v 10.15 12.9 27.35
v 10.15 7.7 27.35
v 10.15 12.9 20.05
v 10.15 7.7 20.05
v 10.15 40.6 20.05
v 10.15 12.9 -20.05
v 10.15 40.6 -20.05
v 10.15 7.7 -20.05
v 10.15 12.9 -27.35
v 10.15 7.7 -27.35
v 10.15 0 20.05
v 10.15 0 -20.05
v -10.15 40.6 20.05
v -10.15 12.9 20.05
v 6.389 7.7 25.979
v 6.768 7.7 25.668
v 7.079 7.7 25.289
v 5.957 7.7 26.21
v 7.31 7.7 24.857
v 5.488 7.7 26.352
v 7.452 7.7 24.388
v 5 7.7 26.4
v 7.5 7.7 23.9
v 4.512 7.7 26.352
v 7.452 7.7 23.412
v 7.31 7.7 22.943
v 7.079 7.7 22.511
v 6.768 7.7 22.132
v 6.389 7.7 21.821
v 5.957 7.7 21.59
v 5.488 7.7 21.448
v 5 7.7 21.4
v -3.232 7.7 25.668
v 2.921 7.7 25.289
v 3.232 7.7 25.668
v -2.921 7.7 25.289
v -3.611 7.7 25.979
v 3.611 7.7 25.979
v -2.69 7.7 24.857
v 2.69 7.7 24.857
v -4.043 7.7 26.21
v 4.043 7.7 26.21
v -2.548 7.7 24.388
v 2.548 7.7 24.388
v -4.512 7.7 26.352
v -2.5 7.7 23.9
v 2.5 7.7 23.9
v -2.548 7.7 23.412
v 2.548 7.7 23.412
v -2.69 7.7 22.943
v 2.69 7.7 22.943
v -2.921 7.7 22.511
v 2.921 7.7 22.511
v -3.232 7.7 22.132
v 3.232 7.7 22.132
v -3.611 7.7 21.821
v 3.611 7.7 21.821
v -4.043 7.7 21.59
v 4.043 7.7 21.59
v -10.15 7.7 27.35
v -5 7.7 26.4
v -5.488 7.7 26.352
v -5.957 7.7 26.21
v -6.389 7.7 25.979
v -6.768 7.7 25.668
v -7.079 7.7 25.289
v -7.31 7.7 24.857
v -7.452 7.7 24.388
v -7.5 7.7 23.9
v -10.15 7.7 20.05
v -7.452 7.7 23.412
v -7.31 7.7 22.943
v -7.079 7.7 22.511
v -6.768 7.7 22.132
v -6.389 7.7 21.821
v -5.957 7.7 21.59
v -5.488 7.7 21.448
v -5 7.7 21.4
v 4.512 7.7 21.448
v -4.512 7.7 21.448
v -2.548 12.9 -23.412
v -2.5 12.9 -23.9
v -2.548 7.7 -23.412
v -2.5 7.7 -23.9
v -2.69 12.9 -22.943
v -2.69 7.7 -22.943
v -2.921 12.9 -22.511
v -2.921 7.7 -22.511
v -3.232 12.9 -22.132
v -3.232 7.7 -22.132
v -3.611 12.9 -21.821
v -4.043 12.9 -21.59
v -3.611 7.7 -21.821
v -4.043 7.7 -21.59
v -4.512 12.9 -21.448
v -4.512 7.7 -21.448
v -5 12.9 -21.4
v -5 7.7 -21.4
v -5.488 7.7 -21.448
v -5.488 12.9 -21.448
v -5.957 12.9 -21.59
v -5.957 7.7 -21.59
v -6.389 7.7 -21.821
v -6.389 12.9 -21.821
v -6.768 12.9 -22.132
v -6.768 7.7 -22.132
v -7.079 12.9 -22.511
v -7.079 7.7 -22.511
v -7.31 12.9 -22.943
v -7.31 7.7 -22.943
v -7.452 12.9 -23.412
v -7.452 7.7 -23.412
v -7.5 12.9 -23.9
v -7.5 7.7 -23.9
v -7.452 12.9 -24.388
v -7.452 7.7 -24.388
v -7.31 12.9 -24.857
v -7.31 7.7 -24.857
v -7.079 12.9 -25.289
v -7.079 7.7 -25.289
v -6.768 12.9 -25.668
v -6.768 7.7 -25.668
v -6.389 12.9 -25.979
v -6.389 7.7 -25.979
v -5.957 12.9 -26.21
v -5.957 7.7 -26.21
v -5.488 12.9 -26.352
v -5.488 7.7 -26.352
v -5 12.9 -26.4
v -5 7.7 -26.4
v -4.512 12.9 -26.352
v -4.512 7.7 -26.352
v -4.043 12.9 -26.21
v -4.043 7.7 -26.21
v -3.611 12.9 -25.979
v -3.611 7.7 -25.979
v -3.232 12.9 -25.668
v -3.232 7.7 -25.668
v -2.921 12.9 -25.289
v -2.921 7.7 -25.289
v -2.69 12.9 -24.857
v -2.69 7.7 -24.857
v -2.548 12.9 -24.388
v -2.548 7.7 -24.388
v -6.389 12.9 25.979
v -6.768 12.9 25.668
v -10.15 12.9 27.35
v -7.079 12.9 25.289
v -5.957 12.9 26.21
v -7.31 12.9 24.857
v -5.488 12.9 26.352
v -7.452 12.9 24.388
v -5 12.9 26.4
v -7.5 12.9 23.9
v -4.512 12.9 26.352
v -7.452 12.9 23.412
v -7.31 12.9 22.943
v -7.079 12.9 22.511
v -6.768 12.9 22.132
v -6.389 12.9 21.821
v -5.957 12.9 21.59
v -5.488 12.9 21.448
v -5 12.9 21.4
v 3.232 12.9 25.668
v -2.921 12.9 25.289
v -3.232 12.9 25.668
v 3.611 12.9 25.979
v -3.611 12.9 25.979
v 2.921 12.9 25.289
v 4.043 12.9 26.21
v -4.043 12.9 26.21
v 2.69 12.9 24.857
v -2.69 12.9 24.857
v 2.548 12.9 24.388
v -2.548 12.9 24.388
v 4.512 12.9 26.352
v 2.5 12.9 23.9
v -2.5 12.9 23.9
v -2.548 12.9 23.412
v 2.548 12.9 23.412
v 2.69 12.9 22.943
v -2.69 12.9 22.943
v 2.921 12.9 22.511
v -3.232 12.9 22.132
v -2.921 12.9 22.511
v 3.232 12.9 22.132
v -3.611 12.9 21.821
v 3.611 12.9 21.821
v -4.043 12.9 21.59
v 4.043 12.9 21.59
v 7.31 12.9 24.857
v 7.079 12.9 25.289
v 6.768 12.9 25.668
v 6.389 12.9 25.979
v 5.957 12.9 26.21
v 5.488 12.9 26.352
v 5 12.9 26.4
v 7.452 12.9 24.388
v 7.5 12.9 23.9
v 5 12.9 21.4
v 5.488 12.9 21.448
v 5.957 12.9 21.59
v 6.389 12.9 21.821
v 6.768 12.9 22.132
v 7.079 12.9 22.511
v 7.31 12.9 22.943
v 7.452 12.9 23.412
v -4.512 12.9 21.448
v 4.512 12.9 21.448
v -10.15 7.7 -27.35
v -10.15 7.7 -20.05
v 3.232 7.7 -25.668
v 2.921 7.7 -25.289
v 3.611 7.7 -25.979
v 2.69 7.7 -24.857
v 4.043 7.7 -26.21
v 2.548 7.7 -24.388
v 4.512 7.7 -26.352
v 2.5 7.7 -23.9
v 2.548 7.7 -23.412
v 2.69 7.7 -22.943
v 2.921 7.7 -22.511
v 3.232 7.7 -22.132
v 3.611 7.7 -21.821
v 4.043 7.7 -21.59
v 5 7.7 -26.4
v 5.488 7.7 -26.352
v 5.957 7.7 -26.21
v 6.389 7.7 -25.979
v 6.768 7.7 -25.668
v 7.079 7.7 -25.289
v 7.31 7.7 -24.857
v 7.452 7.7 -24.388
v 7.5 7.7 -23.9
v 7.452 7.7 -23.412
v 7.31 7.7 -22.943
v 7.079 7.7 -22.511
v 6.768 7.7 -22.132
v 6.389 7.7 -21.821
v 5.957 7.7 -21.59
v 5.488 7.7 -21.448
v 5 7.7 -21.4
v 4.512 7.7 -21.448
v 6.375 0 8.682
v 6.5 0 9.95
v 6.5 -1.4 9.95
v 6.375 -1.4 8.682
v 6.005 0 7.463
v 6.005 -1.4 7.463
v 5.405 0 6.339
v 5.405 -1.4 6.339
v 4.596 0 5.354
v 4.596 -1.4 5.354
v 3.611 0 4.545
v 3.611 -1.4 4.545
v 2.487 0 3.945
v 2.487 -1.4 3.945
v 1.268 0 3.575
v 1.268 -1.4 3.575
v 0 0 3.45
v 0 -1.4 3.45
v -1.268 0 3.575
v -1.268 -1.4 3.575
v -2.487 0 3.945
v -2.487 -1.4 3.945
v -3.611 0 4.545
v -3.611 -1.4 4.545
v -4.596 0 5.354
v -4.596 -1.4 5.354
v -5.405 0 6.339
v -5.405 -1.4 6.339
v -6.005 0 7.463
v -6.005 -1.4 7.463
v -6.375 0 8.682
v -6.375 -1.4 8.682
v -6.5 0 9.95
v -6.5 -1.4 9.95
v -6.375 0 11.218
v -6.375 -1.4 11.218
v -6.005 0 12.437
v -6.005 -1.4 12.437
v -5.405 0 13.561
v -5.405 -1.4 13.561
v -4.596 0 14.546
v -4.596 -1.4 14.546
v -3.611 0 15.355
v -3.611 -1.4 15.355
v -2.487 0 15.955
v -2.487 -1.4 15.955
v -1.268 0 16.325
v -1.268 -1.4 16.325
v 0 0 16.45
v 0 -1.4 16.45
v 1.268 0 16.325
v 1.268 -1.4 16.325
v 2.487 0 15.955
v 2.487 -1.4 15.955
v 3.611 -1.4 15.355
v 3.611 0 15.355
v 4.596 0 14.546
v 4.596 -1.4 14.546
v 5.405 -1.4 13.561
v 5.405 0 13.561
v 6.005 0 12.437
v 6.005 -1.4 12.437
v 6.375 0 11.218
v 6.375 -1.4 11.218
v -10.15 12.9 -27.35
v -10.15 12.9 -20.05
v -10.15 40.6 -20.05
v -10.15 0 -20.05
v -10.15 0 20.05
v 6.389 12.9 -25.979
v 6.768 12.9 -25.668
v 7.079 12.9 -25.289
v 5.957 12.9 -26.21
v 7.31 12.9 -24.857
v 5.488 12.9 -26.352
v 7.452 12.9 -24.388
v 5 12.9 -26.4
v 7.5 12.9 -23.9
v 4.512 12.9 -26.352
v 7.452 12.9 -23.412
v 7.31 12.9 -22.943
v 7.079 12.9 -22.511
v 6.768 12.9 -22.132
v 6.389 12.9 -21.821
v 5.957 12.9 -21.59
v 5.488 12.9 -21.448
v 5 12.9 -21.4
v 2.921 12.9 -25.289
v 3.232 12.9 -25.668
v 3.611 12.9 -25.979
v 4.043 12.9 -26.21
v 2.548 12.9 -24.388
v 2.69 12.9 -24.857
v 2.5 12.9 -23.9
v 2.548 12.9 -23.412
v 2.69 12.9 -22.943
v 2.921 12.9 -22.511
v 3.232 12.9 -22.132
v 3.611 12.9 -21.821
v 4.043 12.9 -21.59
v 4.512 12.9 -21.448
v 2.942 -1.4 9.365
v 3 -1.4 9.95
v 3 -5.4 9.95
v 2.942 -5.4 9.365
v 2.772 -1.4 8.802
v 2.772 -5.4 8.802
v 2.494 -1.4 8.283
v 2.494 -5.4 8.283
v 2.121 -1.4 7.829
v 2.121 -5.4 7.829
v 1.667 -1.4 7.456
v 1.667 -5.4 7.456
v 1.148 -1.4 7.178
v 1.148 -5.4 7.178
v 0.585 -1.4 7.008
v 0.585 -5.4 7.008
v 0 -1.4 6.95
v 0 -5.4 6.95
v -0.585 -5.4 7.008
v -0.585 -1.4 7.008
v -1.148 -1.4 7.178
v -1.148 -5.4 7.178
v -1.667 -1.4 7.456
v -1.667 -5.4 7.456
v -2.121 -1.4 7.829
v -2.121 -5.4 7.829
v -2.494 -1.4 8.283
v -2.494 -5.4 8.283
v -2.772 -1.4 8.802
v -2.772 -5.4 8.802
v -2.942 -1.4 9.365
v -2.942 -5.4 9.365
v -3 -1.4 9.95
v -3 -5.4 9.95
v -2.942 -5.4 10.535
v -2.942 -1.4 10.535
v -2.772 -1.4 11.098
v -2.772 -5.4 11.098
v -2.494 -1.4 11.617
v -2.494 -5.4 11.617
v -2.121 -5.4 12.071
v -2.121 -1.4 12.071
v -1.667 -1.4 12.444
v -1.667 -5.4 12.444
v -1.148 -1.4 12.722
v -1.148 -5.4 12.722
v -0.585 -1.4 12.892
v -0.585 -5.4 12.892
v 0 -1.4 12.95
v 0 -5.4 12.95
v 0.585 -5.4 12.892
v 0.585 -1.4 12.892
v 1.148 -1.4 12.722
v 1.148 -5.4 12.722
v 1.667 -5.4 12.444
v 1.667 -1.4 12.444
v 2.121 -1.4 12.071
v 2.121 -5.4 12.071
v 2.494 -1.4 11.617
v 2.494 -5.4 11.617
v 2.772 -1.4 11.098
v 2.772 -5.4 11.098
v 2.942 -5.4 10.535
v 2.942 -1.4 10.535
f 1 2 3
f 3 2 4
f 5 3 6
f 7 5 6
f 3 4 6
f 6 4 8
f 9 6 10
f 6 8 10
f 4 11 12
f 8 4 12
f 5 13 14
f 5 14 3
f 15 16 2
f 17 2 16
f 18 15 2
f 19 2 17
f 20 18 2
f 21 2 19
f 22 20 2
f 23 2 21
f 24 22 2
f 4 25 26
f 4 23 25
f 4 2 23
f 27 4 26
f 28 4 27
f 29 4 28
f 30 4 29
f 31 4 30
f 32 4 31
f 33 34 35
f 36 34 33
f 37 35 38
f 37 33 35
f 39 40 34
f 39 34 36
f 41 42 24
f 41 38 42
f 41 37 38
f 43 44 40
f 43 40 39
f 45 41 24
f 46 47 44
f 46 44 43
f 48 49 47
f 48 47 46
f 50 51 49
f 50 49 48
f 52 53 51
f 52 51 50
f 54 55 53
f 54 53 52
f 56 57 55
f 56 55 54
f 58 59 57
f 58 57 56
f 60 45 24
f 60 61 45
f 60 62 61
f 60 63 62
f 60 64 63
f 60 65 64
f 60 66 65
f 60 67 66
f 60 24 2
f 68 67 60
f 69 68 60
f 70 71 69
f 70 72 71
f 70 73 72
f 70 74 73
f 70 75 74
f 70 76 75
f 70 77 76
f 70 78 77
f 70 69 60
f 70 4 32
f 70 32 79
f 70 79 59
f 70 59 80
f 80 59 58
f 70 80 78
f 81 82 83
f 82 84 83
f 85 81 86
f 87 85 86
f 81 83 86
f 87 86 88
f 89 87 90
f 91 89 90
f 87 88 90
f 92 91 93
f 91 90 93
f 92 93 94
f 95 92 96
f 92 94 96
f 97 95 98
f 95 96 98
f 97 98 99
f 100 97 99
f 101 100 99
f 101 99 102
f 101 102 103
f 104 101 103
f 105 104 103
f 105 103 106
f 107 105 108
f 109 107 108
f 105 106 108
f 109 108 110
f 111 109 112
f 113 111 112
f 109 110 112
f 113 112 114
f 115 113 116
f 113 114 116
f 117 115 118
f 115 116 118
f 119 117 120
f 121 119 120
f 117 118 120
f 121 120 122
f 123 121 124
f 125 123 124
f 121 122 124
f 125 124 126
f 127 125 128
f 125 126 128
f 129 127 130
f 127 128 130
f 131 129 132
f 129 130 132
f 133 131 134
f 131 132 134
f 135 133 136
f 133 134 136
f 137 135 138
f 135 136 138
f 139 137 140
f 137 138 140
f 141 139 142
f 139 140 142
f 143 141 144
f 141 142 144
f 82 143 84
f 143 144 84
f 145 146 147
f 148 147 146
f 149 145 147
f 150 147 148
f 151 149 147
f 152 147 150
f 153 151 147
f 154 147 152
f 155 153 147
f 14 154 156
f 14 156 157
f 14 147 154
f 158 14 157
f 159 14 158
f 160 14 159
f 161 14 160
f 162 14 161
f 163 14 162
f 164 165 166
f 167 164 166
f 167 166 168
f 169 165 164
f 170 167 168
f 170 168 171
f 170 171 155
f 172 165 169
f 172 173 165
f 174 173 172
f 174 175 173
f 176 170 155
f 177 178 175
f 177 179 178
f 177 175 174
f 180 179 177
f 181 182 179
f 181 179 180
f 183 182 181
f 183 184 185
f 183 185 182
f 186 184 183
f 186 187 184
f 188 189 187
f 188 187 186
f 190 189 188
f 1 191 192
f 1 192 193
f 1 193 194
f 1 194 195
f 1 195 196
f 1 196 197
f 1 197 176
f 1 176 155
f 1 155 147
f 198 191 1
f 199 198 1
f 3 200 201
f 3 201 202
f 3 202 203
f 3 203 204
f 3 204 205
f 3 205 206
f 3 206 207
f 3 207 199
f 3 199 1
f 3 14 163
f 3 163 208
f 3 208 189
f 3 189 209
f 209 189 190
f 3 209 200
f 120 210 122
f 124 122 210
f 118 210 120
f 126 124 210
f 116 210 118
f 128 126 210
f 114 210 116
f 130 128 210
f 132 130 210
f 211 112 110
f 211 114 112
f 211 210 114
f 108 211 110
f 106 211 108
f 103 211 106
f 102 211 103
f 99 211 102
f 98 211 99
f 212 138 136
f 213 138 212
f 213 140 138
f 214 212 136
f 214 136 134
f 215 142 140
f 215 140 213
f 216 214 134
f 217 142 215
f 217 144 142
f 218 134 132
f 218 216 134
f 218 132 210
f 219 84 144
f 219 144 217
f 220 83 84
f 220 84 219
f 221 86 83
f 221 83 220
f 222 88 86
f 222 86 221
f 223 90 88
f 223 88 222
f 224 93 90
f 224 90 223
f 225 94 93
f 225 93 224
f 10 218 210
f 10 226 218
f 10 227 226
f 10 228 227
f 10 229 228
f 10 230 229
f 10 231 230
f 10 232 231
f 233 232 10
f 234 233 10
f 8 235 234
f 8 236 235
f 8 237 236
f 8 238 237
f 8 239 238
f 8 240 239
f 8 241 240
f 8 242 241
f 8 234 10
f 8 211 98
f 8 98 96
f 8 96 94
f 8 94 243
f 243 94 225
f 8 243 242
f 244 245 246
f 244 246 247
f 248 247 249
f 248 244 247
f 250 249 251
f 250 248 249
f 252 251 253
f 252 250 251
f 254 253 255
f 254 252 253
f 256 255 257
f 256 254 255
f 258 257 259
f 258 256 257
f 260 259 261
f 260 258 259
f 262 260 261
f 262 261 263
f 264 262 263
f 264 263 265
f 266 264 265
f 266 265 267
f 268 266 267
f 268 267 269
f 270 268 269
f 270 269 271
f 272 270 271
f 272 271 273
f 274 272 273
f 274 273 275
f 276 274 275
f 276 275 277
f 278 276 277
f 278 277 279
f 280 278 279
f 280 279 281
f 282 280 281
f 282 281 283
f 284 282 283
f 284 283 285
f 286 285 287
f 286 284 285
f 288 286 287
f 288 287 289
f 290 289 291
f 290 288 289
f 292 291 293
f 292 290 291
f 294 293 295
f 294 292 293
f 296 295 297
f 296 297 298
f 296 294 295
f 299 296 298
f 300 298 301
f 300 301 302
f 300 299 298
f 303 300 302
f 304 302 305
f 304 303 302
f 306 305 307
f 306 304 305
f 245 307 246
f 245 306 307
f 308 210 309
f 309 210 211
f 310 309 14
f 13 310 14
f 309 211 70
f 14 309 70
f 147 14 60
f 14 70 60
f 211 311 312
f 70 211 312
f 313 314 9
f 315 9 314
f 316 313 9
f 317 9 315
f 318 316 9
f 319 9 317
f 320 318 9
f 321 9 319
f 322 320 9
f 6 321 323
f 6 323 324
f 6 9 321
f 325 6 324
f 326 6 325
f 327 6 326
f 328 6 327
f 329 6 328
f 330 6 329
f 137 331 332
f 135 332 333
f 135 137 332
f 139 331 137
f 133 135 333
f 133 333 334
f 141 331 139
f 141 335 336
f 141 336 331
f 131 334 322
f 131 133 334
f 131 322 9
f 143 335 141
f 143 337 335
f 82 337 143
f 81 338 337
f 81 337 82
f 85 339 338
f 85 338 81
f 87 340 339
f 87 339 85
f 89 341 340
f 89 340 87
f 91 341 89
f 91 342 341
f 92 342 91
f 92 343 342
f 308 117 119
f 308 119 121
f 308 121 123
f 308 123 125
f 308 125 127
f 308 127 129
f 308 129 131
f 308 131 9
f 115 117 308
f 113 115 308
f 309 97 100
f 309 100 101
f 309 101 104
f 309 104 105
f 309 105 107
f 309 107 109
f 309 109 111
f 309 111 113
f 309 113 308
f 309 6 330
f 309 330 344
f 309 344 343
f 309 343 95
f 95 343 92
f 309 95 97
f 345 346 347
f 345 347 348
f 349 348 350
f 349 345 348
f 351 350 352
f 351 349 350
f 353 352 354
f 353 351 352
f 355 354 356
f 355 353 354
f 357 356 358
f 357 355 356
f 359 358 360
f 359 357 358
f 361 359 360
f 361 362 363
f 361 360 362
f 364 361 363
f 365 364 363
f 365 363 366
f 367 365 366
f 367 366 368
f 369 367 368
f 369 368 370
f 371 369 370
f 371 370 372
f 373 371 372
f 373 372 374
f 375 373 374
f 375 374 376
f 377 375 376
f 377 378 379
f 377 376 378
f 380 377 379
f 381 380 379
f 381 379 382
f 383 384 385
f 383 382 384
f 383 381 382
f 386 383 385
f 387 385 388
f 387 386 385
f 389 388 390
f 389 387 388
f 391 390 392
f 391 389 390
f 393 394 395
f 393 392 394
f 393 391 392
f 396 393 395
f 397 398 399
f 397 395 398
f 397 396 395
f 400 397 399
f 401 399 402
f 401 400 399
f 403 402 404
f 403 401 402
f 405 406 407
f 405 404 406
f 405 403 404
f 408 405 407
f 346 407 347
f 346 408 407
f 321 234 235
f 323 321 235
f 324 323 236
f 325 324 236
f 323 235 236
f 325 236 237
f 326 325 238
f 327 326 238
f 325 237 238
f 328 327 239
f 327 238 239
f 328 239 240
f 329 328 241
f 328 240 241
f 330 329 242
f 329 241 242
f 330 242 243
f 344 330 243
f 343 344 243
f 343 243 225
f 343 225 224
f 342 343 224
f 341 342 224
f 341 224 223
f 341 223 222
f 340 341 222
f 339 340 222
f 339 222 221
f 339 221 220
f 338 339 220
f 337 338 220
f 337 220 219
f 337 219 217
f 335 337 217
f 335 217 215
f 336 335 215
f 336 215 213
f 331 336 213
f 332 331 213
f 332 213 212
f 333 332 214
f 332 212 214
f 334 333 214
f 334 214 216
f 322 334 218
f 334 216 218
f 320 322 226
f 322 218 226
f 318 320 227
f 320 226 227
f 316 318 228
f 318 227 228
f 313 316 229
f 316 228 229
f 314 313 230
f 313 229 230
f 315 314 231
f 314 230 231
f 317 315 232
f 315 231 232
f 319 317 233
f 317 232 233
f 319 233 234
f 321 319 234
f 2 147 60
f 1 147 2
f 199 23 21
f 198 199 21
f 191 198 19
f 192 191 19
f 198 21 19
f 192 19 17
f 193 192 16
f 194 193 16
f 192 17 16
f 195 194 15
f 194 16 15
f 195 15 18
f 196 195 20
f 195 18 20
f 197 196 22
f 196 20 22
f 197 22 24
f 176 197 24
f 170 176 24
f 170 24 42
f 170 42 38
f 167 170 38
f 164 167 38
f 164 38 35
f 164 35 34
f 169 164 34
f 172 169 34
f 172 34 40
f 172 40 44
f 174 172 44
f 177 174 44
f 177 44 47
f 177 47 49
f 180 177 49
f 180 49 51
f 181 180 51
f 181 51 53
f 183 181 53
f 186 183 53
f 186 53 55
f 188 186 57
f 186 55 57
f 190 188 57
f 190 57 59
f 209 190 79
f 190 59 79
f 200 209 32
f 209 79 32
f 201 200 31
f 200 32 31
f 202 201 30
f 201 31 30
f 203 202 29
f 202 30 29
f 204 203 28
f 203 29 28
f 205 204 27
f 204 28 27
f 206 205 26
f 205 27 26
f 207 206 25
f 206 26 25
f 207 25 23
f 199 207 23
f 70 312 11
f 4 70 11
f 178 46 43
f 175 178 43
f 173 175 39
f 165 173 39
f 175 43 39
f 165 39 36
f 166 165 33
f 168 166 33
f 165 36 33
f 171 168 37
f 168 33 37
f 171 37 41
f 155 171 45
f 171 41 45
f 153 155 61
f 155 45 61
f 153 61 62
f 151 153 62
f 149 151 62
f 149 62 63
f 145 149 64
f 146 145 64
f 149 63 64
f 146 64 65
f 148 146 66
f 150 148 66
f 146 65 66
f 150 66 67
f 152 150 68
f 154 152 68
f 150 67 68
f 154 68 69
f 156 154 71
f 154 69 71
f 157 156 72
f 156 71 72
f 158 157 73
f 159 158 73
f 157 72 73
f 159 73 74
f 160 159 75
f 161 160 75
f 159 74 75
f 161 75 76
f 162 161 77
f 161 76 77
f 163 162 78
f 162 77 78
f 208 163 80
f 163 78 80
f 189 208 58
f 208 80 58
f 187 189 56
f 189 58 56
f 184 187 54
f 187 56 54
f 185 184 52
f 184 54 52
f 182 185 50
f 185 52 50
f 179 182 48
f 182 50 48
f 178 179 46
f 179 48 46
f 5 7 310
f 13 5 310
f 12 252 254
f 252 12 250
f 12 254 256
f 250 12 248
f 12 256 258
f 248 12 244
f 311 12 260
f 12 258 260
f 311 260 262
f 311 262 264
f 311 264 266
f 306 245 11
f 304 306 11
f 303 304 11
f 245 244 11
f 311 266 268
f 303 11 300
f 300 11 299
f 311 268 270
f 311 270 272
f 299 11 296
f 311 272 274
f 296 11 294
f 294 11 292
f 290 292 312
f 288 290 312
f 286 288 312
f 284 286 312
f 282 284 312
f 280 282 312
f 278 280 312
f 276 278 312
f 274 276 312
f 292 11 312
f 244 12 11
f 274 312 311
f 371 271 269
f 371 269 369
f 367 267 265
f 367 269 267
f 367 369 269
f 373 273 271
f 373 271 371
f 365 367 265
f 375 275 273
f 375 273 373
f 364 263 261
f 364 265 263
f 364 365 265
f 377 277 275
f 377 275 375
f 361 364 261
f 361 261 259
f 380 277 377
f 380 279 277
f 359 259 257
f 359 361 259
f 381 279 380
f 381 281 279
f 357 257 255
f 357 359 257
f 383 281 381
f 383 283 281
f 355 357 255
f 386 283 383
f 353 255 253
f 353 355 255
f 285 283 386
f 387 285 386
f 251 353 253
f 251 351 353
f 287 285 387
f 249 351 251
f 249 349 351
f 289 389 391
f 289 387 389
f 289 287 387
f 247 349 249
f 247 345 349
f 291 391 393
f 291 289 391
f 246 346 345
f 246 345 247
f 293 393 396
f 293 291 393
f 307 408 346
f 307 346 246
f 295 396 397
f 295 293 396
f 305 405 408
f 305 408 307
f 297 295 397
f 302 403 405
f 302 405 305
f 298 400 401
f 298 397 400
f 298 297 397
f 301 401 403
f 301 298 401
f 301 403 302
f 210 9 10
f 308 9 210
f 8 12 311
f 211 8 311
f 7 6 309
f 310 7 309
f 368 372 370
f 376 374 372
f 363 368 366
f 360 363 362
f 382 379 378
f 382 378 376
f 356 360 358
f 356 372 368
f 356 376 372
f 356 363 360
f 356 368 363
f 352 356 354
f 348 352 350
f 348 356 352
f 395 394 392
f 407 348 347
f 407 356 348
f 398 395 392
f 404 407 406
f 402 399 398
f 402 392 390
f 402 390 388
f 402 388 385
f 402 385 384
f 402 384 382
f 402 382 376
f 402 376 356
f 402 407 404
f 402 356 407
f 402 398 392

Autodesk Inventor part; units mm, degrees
ref_plane "YZ Plane" through (0, 0, 0) normal (1, 0, 0) x (0, 1, 0)
ref_plane "XZ Plane" through (0, 0, 0) normal (0, 1, 0) x (-1, 0, 0)
ref_plane "XY Plane" through (0, 0, 0) normal (0, 0, 1) x (1, 0, 0)
sketch "Skizze1" plane through (0, 0, 0) normal (0, 1, 0) x (-1, 0, 0)
  line L0 (10.15, 20.05) -> (-10.15, 20.05)
  line L1 (-10.15, 20.05) -> (-10.15, -20.05)
  line L2 (-10.15, -20.05) -> (10.15, -20.05)
  line L3 (10.15, -20.05) -> (10.15, 20.05)
  line L4 (14.21, 0) -> (-14.21, 0) projected
  line L5 (0, -28.07) -> (0, 28.07) projected
  point P0 (0, 0)
  dimension "d0" = 40.1
  dimension "d1" = 20.3
extrude "Extrusion1" add sketch "Skizze1" along normal blind 40.6
sketch "Skizze2" plane through (0, 0, 0) normal (0, -1, 0) x (1, 0, 0)
  circle A0 centre (0, 9.95) radius 6.5
  line L0 (10.15, -20.05) -> (-10.15, -20.05) projected
  line L1 (0, 28.07) -> (0, -28.07) projected
  point P0 (0, 0)
  dimension "d4" = 13
  dimension "d5" = 30
  dimension "d6" = 0
extrude "Extrusion2" add sketch "Skizze2" along normal blind 1.4
sketch "Skizze3" plane through (0, -1.4, 9.95) normal (0, -1, 0) x (1, 0, 0)
  circle A0 centre (0, 0) radius 3
  point P0 (0, -9.95)
  dimension "d9" = 6
extrude "Extrusion3" add sketch "Skizze3" along normal blind 4
sketch "Skizze4" plane through (-10.15, 0, 20.05) normal (0, 0, 1) x (1, 0, 0)
  line L0 (20.3, 7.7) -> (0, 7.7)
  line L1 (0, 7.7) -> (0, 12.9)
  line L2 (0, 12.9) -> (20.3, 12.9)
  line L3 (20.3, 12.9) -> (20.3, 7.7)
  line L4 (0, 0) -> (20.3, 0) projected
  line L5 (20.3, 0) -> (20.3, 40.6) projected
  point P0 (10.15, 0)
  point P1 (20.3, 10.3)
  dimension "d12" = 0
  dimension "d13" = 7.7
  dimension "d14" = 5.2
extrude "Extrusion4" add sketch "Skizze4" along normal blind 7.3
sketch "Skizze5" plane through (10.15, 0, -20.05) normal (0, 0, -1) x (-1, 0, 0)
  line L0 (20.3, 7.7) -> (0, 7.7)
  line L1 (0, 7.7) -> (0, 12.9)
  line L2 (0, 12.9) -> (20.3, 12.9)
  line L3 (20.3, 12.9) -> (20.3, 7.7)
  line L4 (0, 0) -> (20.3, 0) projected
  line L5 (20.3, 0) -> (20.3, 40.6) projected
  point P0 (10.15, 0)
  dimension "d17" = 0
  dimension "d20" = 7.7
  dimension "d21" = 5.2
extrude "Extrusion5" add sketch "Skizze5" along normal blind 7.3
sketch "Skizze6" plane through (-10.15, 7.7, 20.05) normal (0, -1, 0) x (1, 0, 0)
  circle A0 centre (15.15, 3.85) radius 2.5
  circle A1 centre (5.15, 3.85) radius 2.5
  circle A2 centre (15.15, -43.95) radius 2.5
  circle A3 centre (5.15, -43.95) radius 2.5
  line L0 (10.15, -58.34) -> (10.15, 18.24) projected
  line L1 (0, 7.3) -> (20.3, 7.3) projected
  line L2 (0, 0) -> (20.3, 0) projected
  line L3 (20.3, -40.1) -> (0, -40.1) projected
  point P0 (10.15, -20.05)
  dimension "d22" = 5
  dimension "d23" = 10
  dimension "d29" = 47.8
  dimension "d30" = 3.45
extrude "Extrusion6" cut sketch "Skizze6" against normal blind 7.3
properties part number "stepper_new"
